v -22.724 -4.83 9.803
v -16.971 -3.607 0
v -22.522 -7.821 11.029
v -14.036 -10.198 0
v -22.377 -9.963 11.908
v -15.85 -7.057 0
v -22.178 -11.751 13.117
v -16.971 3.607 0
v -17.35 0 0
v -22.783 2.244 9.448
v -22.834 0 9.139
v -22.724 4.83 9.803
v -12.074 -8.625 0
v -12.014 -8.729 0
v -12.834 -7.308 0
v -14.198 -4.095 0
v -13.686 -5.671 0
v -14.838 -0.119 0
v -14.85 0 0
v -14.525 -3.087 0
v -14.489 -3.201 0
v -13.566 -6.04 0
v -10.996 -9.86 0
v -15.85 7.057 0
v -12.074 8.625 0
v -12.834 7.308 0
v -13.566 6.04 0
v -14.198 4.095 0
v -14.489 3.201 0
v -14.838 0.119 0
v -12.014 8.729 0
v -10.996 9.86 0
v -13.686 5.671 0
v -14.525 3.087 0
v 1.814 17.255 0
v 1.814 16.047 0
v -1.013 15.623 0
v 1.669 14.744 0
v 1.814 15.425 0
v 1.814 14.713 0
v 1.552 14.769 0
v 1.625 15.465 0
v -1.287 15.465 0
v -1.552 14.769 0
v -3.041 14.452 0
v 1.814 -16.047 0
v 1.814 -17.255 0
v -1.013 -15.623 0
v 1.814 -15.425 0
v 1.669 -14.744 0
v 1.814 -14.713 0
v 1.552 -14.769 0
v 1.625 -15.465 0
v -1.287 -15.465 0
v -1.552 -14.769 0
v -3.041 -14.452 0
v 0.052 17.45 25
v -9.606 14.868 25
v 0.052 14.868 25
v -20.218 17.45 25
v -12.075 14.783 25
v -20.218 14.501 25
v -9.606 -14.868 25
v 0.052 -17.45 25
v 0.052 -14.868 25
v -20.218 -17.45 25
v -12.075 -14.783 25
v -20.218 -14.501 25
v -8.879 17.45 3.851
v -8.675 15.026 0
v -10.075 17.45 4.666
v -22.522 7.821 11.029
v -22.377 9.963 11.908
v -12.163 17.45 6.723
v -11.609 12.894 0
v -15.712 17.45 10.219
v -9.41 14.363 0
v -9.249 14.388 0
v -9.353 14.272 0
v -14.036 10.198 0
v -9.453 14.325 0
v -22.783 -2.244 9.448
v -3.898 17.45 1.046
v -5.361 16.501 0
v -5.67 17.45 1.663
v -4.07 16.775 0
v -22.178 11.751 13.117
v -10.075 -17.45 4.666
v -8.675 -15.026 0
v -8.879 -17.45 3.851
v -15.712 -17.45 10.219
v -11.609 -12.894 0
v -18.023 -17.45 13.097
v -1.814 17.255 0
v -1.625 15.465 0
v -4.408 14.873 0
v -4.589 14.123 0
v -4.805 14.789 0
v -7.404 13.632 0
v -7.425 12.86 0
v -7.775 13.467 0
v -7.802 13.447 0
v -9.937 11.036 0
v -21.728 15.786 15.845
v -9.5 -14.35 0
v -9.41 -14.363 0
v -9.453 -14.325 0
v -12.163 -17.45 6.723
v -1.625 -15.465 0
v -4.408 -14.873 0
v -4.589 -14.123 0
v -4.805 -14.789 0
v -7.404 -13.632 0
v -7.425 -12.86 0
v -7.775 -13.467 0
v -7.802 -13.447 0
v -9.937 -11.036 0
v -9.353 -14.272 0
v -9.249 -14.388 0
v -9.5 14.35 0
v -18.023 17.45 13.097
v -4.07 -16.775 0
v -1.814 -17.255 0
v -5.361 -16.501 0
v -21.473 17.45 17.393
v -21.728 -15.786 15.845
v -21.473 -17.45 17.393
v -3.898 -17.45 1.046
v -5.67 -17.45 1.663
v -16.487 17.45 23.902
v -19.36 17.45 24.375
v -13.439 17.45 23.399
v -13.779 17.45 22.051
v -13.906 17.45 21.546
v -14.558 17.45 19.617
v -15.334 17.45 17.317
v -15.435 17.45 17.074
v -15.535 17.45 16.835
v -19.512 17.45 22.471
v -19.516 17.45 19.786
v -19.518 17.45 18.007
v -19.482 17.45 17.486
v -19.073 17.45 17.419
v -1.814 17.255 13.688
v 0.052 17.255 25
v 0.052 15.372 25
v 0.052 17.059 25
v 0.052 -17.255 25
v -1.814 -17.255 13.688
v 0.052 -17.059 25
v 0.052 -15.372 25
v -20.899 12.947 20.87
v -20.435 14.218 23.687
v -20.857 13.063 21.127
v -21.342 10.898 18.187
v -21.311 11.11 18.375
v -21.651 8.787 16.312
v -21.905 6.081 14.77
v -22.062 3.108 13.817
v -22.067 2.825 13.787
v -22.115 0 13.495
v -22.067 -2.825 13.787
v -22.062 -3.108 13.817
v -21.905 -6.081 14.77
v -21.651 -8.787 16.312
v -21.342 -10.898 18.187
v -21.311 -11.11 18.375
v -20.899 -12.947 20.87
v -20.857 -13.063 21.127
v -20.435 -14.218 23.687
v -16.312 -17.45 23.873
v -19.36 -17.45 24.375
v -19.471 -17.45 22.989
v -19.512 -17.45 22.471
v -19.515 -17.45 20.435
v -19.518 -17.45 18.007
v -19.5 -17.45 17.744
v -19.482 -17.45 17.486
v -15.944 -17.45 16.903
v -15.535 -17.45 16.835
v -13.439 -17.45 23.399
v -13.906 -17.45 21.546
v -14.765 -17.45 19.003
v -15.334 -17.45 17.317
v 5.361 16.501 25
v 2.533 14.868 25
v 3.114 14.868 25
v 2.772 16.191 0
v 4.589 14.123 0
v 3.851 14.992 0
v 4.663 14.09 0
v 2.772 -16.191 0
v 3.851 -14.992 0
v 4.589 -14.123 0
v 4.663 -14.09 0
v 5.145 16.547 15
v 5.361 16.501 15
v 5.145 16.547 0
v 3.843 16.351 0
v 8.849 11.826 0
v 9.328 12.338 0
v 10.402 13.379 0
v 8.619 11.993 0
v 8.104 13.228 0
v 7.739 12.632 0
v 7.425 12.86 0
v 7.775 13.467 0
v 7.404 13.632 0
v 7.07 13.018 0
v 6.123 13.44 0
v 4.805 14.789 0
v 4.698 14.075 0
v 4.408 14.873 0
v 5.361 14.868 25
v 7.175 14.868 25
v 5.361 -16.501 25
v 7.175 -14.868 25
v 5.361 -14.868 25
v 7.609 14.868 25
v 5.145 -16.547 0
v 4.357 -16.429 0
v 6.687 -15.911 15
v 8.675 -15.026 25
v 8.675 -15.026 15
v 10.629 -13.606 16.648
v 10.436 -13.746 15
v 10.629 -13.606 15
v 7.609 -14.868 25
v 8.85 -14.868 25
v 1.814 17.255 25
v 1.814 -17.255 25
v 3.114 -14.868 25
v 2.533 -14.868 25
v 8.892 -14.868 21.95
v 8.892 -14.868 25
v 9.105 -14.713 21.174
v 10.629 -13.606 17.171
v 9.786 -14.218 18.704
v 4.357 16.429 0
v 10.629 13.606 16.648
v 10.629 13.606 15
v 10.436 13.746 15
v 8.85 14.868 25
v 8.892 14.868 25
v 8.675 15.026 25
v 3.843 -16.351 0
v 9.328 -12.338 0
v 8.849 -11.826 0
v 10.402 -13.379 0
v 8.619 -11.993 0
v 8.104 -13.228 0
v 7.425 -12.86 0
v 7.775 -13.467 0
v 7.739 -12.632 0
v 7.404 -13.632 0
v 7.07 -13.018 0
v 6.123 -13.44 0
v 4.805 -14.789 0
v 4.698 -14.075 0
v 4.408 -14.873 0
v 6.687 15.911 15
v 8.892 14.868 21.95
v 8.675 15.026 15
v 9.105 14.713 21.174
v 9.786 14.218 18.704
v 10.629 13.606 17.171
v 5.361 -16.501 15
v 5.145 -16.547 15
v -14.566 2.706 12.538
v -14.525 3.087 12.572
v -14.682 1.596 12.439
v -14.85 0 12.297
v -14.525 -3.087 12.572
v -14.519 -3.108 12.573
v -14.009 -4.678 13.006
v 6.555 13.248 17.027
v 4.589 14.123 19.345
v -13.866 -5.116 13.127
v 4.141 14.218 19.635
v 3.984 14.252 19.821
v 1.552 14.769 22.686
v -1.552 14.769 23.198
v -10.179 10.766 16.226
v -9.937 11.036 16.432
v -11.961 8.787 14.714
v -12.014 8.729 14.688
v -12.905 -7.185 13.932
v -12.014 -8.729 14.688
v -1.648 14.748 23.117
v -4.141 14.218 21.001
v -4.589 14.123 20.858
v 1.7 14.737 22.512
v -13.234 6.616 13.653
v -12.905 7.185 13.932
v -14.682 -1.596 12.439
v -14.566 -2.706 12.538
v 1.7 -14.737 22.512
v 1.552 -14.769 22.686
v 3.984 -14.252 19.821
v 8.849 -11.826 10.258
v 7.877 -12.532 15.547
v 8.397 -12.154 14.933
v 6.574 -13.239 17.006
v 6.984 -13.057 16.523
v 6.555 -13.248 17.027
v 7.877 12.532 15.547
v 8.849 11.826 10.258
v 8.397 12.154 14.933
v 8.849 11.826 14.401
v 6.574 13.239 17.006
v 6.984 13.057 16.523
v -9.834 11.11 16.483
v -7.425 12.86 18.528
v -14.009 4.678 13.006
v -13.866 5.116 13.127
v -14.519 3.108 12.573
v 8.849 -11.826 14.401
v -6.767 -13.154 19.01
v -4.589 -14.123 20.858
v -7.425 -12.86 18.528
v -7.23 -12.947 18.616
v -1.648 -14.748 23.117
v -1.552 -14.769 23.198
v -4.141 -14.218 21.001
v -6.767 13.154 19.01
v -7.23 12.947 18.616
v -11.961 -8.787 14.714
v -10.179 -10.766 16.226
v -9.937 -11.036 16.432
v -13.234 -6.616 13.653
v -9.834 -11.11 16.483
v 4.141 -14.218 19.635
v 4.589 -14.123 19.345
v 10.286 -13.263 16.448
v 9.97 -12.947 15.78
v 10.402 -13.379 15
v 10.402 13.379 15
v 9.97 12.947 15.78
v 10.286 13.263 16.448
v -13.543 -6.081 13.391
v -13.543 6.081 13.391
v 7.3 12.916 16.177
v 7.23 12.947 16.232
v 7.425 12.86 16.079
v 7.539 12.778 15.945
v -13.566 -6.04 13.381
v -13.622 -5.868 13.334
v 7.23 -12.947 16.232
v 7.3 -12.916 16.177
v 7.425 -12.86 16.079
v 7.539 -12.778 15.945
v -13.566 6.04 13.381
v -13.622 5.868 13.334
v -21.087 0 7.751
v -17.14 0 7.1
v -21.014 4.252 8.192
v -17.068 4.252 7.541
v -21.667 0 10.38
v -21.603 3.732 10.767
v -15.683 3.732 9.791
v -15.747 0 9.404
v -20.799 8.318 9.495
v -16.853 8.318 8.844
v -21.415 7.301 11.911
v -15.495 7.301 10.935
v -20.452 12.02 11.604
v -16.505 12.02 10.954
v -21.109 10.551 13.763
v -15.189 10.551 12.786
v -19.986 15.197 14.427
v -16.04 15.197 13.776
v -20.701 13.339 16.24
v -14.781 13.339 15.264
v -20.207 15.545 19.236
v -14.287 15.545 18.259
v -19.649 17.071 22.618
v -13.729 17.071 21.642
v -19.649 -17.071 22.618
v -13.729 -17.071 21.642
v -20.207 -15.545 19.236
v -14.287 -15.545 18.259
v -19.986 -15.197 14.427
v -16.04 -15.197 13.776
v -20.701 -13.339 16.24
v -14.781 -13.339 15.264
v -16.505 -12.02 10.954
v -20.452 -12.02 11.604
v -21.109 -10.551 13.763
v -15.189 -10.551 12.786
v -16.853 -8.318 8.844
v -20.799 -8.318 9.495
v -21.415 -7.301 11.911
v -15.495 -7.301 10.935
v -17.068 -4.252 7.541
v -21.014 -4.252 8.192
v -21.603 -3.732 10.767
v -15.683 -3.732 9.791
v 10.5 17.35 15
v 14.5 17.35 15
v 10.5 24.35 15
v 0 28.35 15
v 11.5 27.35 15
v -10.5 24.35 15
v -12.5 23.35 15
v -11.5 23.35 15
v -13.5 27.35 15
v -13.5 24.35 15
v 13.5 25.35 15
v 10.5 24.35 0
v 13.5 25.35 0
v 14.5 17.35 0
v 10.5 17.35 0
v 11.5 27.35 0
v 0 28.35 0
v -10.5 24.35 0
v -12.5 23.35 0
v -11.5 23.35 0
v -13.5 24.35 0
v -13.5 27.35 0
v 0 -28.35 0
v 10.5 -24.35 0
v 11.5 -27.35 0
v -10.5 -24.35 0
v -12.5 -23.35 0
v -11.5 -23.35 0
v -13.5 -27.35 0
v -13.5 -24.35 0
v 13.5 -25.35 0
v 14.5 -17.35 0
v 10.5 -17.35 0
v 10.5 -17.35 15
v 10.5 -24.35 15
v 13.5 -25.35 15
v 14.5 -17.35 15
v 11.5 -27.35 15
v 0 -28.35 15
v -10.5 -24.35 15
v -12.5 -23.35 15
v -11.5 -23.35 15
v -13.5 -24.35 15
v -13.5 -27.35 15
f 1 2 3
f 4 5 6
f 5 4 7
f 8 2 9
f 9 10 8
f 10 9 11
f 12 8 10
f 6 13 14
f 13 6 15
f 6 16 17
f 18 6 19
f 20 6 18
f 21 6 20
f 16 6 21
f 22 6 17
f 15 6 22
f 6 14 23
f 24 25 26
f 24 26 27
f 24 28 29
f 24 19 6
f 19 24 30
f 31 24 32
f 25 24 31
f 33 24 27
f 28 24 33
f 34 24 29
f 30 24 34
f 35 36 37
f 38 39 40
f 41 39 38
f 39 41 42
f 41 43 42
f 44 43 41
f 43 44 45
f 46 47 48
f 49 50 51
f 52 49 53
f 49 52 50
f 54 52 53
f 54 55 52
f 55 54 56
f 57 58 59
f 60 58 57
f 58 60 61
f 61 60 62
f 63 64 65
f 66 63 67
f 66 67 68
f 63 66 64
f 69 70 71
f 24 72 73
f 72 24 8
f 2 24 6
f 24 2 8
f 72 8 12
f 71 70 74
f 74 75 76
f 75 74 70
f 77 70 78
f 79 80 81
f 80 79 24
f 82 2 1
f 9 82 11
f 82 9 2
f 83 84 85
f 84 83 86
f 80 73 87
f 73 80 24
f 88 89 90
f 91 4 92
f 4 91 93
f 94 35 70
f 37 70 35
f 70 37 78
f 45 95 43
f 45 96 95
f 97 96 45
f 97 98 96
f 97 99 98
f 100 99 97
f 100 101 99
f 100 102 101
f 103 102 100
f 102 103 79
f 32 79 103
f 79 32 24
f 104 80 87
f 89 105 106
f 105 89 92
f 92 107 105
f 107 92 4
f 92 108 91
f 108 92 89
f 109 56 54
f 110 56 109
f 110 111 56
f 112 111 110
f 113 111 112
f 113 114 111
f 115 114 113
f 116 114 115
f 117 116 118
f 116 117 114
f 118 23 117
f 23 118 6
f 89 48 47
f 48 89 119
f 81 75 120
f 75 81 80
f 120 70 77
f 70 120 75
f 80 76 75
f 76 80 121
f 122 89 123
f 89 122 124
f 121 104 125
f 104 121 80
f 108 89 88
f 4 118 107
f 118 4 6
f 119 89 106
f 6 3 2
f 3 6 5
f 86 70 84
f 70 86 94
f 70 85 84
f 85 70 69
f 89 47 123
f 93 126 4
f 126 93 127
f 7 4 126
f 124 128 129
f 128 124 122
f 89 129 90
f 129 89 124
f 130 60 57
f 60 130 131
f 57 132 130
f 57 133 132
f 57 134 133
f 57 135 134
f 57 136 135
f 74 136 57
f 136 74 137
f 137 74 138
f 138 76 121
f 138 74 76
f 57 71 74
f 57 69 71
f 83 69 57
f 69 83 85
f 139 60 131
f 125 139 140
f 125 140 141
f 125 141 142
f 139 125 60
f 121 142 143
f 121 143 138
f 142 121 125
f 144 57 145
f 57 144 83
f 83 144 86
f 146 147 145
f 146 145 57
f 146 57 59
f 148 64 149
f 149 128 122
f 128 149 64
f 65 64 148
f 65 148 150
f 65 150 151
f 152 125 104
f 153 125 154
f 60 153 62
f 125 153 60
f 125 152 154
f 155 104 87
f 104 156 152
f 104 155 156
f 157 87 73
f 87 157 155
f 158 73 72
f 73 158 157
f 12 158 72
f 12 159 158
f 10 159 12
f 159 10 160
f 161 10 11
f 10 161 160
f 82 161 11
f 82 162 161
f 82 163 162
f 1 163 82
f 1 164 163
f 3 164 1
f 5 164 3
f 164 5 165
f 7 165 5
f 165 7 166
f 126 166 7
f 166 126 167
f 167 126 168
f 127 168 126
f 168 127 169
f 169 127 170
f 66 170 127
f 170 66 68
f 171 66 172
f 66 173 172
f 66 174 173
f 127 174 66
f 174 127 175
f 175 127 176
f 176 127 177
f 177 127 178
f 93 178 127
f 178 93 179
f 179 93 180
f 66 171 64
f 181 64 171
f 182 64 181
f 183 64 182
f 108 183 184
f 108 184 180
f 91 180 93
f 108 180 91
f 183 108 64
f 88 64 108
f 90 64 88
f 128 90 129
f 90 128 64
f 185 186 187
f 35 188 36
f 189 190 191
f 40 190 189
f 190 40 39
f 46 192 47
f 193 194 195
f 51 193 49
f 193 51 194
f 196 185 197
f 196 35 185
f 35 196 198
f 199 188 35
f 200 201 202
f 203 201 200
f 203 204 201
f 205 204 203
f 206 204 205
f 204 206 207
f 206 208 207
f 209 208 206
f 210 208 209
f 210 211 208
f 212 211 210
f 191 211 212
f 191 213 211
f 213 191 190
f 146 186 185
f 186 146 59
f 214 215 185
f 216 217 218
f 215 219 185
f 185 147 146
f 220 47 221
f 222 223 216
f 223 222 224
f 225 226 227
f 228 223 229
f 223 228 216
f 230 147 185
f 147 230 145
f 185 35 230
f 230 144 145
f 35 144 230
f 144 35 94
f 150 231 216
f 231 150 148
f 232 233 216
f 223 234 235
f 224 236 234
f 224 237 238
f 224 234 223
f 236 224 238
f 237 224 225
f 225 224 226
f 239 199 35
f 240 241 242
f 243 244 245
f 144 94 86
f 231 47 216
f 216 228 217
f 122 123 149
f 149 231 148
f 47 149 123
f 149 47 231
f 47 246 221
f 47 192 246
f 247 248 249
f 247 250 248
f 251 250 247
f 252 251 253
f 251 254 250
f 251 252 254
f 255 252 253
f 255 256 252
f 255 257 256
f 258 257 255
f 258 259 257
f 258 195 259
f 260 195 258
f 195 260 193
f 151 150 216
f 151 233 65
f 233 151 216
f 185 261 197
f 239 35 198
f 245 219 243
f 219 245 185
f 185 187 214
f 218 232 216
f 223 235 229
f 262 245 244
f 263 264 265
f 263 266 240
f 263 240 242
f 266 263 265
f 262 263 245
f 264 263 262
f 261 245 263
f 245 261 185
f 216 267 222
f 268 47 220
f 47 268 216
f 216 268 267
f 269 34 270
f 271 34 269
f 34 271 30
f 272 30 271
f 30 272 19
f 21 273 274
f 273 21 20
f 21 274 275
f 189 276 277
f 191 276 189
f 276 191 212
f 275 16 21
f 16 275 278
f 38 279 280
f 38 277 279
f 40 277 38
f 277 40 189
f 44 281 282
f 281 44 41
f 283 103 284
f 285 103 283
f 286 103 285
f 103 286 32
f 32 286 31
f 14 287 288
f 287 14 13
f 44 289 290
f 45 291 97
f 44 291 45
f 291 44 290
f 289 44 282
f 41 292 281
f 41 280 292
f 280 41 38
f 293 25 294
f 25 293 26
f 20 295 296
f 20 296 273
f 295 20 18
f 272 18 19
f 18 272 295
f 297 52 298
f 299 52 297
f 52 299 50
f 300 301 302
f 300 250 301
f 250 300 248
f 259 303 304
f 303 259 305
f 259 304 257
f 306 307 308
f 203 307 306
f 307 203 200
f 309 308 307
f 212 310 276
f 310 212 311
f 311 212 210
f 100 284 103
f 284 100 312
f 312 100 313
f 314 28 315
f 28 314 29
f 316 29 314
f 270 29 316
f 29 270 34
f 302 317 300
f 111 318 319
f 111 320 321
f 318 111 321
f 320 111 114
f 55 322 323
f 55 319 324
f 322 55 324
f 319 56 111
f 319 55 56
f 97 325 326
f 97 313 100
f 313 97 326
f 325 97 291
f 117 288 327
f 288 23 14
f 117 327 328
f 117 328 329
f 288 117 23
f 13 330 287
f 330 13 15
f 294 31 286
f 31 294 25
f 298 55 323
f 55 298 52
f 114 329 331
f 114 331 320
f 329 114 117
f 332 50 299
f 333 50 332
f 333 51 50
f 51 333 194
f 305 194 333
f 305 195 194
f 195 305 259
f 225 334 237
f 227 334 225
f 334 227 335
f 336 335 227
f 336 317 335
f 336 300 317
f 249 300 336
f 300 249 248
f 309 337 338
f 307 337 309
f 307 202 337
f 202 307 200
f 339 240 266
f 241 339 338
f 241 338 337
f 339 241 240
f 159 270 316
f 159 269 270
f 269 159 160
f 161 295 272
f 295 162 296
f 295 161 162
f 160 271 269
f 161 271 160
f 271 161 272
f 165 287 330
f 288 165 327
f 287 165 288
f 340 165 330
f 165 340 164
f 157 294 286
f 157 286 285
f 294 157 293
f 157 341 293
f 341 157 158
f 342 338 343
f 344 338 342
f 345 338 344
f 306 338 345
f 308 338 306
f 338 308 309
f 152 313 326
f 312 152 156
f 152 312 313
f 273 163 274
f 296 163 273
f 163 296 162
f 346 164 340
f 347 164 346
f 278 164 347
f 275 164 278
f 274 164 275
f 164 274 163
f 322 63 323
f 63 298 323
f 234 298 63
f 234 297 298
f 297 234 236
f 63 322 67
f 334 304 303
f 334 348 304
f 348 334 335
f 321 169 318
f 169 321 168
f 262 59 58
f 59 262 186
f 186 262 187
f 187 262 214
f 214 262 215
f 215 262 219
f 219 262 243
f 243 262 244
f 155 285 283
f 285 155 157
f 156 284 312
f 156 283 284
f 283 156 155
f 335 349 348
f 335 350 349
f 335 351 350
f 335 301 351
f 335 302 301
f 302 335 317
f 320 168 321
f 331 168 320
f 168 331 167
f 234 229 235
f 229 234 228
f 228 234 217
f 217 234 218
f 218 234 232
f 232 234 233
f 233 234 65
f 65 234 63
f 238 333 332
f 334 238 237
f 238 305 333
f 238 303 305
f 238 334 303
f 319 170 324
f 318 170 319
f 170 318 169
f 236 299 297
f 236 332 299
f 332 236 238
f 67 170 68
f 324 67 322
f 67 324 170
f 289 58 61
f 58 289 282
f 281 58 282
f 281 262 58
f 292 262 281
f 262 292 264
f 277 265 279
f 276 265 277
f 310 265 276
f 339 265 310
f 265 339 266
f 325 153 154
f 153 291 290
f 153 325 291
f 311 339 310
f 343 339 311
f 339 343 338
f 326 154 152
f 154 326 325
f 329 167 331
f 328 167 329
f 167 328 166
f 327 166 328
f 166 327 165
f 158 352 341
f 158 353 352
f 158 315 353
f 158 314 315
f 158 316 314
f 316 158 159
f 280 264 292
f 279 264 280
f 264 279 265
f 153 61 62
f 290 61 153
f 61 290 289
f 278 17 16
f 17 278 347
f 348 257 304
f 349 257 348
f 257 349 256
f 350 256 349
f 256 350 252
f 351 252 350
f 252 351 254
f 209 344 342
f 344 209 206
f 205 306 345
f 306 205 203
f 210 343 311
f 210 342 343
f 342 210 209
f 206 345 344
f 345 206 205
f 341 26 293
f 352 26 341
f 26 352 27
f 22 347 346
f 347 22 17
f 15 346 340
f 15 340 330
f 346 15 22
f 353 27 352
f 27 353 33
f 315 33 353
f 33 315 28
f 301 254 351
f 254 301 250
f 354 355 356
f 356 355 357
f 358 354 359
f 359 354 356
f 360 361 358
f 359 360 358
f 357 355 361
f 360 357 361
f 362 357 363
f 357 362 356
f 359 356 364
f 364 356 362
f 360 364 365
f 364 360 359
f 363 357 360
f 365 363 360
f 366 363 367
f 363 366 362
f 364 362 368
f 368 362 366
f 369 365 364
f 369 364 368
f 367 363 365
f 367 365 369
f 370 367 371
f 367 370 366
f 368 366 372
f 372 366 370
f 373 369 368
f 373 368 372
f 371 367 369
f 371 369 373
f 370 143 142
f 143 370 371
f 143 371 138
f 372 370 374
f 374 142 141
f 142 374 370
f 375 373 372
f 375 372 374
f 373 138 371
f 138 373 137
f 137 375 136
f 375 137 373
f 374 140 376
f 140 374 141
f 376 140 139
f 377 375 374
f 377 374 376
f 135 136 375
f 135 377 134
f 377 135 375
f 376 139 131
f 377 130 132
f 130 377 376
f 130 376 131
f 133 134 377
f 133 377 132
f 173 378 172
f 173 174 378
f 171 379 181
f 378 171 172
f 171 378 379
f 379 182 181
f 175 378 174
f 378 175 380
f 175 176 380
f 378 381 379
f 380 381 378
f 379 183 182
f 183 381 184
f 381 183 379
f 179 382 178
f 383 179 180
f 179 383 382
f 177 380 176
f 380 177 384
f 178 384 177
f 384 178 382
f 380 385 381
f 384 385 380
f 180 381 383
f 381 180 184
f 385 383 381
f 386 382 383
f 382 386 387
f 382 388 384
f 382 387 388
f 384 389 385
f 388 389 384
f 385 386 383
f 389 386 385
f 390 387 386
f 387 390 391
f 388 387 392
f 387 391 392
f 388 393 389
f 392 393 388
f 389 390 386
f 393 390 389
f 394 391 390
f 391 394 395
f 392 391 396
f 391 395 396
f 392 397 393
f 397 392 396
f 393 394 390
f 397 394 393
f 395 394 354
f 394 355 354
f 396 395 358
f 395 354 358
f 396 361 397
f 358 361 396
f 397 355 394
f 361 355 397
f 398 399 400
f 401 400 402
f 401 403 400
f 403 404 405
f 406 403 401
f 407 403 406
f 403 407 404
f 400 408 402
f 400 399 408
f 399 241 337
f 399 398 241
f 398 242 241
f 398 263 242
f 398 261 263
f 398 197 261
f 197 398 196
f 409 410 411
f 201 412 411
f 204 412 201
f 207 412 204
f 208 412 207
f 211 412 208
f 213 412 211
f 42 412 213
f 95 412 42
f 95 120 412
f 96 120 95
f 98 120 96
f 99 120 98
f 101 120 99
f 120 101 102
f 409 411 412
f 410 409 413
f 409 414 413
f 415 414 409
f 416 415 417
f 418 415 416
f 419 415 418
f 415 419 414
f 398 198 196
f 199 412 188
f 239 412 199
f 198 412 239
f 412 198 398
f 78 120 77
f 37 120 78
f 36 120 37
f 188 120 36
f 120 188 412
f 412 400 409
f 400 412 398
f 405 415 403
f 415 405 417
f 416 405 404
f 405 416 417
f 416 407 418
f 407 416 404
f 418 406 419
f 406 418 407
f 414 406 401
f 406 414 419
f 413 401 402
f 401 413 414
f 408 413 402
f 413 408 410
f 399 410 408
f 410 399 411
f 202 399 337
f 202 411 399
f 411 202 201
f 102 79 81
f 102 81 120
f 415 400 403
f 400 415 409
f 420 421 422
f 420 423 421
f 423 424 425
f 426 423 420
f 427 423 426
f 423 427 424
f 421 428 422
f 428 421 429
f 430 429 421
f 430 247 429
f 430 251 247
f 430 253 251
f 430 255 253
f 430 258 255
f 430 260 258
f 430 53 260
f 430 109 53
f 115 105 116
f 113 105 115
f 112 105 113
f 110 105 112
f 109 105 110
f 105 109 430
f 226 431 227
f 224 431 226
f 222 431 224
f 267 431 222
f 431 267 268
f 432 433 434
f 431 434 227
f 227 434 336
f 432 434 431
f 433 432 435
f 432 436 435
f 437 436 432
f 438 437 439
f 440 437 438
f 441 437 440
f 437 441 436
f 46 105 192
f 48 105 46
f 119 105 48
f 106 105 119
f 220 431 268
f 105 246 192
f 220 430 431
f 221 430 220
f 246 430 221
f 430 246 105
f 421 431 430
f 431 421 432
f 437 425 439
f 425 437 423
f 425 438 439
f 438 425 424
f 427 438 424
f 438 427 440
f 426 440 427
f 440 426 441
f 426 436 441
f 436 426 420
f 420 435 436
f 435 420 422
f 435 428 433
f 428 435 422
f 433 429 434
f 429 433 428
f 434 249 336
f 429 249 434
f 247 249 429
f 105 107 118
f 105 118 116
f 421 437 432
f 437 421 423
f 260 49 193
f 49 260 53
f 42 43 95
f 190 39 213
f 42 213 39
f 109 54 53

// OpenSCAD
seat_tube_diameter = 28.9;
top_tube_diameter = 28.7;
seat_tube_angle = 74;

seat_stay_diameter = 19.1;

inflateMM = 0.5; // allow room for a piece of inner tube under the clip

seat_staytube_triangle_lengths = [
	125, // seat stay
	85, // seat tube
	107, // distance from st point to ss point
];

seat_stay_triangle_lengths = [
	120, // seat stay
	120, // seat stay
	59, // distance from ss point to ss point
];

translate([0,0,25]) rotate([0,-90,0]) tigrMount();

module tigrMount() {
	difference() {
	rotate([0, 270-ttRotate()[1], 0]) {
		difference() {
			union() {
				ttClip(25);
				// stClip(25, 4);
			}
			#seat_assembly(inflateBy = inflateMM);
			zipCutout( seat_tube_diameter/2+3+inflateMM, stRotate()[1]+90, -16);
		}
	}
		translate([-50,-50,-100 - top_tube_diameter*0.4]) cube([100,100,100]);
	}

	difference() {
		translate([-10,0,0]) union() {
			tigrCatch2(3, 15);
			tigrCatch2(3, 15, true);
		}
		rotate([0, 270-ttRotate()[1], 0]) seat_assembly(inflateBy = inflateMM+0.7);
	}
}
module zipCutout(r, angle, z) {
	wid = 2.5;
	rotate([0, 90+angle, 0])
	translate([0,0,-z])
	rotate_extrude() polygon([
		[r, 3],
		[r+wid, 2],
		[r+wid, -2],
		[r, -3],
		]);
	// rotate_extrude() translate([r+wid/2,0,0]) square(size=[ wid, 6], center=true);
}

module tigrCatch2(offset = 3, length = 8, zflip = false) {
	tigrZ = 21;
	tigry = top_tube_diameter/2+offset;
	tigrx = 7;
	zrot = zflip ? 180 : 0;
	difference() {
		translate([zflip ? -length : 0, 0, 0])
		rotate([0,-90,zrot])
		linear_extrude(height=length) 
			polygon([
				[-4,top_tube_diameter/4],
				// [-tigrZ/2 - 3, tigry - offset],
				[-tigrZ/2 - 4, tigry],
				[-tigrZ/2 - 3, tigry + tigrx + 1],
				[-tigrZ/2 - 1, tigry + tigrx + 3],
				[0, tigry + tigrx + 4],
				[tigrZ/2 + 3, tigry + tigrx + 3],
				[tigrZ/2 + 3, tigry + tigrx + 0],
				[tigrZ/2 + 2, tigry + tigrx - 1],
				[tigrZ/2 + 1, tigry + tigrx - 1],
				[tigrZ/2 + 0, tigry + tigrx ],
				[-tigrZ/2 + 0, tigry + tigrx ],
				[-tigrZ/2 + 0, tigry ],
				[tigrZ/2-1, tigry - offset],
				]);
		rotate([0,0,zrot]) translate([0,tigry + tigrx/2,0]) cube(size=[100, tigrx, tigrZ], center=true);
	}
	
}


module ttClip(len=30, zip = true) {
	difference() {
		union() {
			top_tube(len, 3, offset = 0);
			if (zip) {
				intersection() {
					rotate(ttRotate()) 
						cylinder(
							r1=top_tube_diameter/2 + 18, 
							r2=top_tube_diameter/2 + 3, 
							h=len, center=false);
					translate([0,0,top_tube_diameter/2-4]) rotate(stRotate()) 
						cube(size=[100, seat_tube_diameter+6, 20], center=true);
				}
	
			}
		}
		top_tube(len+1, inflateMM, offset = 0);
		translate([-len/2,0,-top_tube_diameter * 0.465]) 
			rotate(ttRotate()) 
				rotate([45,90,0]) 
					cube(size=[len*5, len, len], center=true);
	}
}

module seat_assembly(inflateBy = 0) {
	seat_tube(inflateBy = inflateBy);
	seat_stay(inflateBy = inflateBy);
	seat_stay(-1, inflateBy = inflateBy);	
	top_tube(inflateBy = inflateBy);
}

module top_tube(len=200, inflateBy = 0, offset = 0) {
	rotate(ttRotate()) 
		rawTT(len, inflateBy, offset);
}

module seat_tube(len=200, inflateBy = 0) {
	rotate(stRotate()) 
		rawST(zTranslate = -seat_stay_diameter*2, inflateBy = inflateBy);		
}

module rawST(len=200, zTranslate = 0, inflateBy = 0) {
	translate([0,0,zTranslate])
		cylinder(r=seat_tube_diameter/2 + inflateBy, h=len, center=false);			
}
module rawTT(len=200, inflateBy = 0, offset = 0) {
	translate([0,0,offset])
		cylinder(r=top_tube_diameter/2 + inflateBy, h=len, center=false);			
}

function stRotate() = [0,270-seat_tube_angle,0];
function ttRotate() = [0,270-seat_tube_angle+ atan( 60.65 / 10),0];

module seat_stay(direction=1, len=200, inflateBy = 0) {
	rotate([
		direction * seat_stay_angle(seat_stay_triangle_lengths)/2,
		270-(seat_stay_angle(seat_staytube_triangle_lengths)+seat_tube_angle),
		0
	]) {
		cylinder(r=seat_stay_diameter/2 + inflateBy, h=len, center=false);		
	}
}

function sqr(val) = val*val;

function seat_stay_angle(triangle) = acos(
	(
		sqr(triangle[0]) + 
		sqr(triangle[1]) -
		sqr(triangle[2])
	) / (
		2 * triangle[0] * triangle[1]
	)
);
